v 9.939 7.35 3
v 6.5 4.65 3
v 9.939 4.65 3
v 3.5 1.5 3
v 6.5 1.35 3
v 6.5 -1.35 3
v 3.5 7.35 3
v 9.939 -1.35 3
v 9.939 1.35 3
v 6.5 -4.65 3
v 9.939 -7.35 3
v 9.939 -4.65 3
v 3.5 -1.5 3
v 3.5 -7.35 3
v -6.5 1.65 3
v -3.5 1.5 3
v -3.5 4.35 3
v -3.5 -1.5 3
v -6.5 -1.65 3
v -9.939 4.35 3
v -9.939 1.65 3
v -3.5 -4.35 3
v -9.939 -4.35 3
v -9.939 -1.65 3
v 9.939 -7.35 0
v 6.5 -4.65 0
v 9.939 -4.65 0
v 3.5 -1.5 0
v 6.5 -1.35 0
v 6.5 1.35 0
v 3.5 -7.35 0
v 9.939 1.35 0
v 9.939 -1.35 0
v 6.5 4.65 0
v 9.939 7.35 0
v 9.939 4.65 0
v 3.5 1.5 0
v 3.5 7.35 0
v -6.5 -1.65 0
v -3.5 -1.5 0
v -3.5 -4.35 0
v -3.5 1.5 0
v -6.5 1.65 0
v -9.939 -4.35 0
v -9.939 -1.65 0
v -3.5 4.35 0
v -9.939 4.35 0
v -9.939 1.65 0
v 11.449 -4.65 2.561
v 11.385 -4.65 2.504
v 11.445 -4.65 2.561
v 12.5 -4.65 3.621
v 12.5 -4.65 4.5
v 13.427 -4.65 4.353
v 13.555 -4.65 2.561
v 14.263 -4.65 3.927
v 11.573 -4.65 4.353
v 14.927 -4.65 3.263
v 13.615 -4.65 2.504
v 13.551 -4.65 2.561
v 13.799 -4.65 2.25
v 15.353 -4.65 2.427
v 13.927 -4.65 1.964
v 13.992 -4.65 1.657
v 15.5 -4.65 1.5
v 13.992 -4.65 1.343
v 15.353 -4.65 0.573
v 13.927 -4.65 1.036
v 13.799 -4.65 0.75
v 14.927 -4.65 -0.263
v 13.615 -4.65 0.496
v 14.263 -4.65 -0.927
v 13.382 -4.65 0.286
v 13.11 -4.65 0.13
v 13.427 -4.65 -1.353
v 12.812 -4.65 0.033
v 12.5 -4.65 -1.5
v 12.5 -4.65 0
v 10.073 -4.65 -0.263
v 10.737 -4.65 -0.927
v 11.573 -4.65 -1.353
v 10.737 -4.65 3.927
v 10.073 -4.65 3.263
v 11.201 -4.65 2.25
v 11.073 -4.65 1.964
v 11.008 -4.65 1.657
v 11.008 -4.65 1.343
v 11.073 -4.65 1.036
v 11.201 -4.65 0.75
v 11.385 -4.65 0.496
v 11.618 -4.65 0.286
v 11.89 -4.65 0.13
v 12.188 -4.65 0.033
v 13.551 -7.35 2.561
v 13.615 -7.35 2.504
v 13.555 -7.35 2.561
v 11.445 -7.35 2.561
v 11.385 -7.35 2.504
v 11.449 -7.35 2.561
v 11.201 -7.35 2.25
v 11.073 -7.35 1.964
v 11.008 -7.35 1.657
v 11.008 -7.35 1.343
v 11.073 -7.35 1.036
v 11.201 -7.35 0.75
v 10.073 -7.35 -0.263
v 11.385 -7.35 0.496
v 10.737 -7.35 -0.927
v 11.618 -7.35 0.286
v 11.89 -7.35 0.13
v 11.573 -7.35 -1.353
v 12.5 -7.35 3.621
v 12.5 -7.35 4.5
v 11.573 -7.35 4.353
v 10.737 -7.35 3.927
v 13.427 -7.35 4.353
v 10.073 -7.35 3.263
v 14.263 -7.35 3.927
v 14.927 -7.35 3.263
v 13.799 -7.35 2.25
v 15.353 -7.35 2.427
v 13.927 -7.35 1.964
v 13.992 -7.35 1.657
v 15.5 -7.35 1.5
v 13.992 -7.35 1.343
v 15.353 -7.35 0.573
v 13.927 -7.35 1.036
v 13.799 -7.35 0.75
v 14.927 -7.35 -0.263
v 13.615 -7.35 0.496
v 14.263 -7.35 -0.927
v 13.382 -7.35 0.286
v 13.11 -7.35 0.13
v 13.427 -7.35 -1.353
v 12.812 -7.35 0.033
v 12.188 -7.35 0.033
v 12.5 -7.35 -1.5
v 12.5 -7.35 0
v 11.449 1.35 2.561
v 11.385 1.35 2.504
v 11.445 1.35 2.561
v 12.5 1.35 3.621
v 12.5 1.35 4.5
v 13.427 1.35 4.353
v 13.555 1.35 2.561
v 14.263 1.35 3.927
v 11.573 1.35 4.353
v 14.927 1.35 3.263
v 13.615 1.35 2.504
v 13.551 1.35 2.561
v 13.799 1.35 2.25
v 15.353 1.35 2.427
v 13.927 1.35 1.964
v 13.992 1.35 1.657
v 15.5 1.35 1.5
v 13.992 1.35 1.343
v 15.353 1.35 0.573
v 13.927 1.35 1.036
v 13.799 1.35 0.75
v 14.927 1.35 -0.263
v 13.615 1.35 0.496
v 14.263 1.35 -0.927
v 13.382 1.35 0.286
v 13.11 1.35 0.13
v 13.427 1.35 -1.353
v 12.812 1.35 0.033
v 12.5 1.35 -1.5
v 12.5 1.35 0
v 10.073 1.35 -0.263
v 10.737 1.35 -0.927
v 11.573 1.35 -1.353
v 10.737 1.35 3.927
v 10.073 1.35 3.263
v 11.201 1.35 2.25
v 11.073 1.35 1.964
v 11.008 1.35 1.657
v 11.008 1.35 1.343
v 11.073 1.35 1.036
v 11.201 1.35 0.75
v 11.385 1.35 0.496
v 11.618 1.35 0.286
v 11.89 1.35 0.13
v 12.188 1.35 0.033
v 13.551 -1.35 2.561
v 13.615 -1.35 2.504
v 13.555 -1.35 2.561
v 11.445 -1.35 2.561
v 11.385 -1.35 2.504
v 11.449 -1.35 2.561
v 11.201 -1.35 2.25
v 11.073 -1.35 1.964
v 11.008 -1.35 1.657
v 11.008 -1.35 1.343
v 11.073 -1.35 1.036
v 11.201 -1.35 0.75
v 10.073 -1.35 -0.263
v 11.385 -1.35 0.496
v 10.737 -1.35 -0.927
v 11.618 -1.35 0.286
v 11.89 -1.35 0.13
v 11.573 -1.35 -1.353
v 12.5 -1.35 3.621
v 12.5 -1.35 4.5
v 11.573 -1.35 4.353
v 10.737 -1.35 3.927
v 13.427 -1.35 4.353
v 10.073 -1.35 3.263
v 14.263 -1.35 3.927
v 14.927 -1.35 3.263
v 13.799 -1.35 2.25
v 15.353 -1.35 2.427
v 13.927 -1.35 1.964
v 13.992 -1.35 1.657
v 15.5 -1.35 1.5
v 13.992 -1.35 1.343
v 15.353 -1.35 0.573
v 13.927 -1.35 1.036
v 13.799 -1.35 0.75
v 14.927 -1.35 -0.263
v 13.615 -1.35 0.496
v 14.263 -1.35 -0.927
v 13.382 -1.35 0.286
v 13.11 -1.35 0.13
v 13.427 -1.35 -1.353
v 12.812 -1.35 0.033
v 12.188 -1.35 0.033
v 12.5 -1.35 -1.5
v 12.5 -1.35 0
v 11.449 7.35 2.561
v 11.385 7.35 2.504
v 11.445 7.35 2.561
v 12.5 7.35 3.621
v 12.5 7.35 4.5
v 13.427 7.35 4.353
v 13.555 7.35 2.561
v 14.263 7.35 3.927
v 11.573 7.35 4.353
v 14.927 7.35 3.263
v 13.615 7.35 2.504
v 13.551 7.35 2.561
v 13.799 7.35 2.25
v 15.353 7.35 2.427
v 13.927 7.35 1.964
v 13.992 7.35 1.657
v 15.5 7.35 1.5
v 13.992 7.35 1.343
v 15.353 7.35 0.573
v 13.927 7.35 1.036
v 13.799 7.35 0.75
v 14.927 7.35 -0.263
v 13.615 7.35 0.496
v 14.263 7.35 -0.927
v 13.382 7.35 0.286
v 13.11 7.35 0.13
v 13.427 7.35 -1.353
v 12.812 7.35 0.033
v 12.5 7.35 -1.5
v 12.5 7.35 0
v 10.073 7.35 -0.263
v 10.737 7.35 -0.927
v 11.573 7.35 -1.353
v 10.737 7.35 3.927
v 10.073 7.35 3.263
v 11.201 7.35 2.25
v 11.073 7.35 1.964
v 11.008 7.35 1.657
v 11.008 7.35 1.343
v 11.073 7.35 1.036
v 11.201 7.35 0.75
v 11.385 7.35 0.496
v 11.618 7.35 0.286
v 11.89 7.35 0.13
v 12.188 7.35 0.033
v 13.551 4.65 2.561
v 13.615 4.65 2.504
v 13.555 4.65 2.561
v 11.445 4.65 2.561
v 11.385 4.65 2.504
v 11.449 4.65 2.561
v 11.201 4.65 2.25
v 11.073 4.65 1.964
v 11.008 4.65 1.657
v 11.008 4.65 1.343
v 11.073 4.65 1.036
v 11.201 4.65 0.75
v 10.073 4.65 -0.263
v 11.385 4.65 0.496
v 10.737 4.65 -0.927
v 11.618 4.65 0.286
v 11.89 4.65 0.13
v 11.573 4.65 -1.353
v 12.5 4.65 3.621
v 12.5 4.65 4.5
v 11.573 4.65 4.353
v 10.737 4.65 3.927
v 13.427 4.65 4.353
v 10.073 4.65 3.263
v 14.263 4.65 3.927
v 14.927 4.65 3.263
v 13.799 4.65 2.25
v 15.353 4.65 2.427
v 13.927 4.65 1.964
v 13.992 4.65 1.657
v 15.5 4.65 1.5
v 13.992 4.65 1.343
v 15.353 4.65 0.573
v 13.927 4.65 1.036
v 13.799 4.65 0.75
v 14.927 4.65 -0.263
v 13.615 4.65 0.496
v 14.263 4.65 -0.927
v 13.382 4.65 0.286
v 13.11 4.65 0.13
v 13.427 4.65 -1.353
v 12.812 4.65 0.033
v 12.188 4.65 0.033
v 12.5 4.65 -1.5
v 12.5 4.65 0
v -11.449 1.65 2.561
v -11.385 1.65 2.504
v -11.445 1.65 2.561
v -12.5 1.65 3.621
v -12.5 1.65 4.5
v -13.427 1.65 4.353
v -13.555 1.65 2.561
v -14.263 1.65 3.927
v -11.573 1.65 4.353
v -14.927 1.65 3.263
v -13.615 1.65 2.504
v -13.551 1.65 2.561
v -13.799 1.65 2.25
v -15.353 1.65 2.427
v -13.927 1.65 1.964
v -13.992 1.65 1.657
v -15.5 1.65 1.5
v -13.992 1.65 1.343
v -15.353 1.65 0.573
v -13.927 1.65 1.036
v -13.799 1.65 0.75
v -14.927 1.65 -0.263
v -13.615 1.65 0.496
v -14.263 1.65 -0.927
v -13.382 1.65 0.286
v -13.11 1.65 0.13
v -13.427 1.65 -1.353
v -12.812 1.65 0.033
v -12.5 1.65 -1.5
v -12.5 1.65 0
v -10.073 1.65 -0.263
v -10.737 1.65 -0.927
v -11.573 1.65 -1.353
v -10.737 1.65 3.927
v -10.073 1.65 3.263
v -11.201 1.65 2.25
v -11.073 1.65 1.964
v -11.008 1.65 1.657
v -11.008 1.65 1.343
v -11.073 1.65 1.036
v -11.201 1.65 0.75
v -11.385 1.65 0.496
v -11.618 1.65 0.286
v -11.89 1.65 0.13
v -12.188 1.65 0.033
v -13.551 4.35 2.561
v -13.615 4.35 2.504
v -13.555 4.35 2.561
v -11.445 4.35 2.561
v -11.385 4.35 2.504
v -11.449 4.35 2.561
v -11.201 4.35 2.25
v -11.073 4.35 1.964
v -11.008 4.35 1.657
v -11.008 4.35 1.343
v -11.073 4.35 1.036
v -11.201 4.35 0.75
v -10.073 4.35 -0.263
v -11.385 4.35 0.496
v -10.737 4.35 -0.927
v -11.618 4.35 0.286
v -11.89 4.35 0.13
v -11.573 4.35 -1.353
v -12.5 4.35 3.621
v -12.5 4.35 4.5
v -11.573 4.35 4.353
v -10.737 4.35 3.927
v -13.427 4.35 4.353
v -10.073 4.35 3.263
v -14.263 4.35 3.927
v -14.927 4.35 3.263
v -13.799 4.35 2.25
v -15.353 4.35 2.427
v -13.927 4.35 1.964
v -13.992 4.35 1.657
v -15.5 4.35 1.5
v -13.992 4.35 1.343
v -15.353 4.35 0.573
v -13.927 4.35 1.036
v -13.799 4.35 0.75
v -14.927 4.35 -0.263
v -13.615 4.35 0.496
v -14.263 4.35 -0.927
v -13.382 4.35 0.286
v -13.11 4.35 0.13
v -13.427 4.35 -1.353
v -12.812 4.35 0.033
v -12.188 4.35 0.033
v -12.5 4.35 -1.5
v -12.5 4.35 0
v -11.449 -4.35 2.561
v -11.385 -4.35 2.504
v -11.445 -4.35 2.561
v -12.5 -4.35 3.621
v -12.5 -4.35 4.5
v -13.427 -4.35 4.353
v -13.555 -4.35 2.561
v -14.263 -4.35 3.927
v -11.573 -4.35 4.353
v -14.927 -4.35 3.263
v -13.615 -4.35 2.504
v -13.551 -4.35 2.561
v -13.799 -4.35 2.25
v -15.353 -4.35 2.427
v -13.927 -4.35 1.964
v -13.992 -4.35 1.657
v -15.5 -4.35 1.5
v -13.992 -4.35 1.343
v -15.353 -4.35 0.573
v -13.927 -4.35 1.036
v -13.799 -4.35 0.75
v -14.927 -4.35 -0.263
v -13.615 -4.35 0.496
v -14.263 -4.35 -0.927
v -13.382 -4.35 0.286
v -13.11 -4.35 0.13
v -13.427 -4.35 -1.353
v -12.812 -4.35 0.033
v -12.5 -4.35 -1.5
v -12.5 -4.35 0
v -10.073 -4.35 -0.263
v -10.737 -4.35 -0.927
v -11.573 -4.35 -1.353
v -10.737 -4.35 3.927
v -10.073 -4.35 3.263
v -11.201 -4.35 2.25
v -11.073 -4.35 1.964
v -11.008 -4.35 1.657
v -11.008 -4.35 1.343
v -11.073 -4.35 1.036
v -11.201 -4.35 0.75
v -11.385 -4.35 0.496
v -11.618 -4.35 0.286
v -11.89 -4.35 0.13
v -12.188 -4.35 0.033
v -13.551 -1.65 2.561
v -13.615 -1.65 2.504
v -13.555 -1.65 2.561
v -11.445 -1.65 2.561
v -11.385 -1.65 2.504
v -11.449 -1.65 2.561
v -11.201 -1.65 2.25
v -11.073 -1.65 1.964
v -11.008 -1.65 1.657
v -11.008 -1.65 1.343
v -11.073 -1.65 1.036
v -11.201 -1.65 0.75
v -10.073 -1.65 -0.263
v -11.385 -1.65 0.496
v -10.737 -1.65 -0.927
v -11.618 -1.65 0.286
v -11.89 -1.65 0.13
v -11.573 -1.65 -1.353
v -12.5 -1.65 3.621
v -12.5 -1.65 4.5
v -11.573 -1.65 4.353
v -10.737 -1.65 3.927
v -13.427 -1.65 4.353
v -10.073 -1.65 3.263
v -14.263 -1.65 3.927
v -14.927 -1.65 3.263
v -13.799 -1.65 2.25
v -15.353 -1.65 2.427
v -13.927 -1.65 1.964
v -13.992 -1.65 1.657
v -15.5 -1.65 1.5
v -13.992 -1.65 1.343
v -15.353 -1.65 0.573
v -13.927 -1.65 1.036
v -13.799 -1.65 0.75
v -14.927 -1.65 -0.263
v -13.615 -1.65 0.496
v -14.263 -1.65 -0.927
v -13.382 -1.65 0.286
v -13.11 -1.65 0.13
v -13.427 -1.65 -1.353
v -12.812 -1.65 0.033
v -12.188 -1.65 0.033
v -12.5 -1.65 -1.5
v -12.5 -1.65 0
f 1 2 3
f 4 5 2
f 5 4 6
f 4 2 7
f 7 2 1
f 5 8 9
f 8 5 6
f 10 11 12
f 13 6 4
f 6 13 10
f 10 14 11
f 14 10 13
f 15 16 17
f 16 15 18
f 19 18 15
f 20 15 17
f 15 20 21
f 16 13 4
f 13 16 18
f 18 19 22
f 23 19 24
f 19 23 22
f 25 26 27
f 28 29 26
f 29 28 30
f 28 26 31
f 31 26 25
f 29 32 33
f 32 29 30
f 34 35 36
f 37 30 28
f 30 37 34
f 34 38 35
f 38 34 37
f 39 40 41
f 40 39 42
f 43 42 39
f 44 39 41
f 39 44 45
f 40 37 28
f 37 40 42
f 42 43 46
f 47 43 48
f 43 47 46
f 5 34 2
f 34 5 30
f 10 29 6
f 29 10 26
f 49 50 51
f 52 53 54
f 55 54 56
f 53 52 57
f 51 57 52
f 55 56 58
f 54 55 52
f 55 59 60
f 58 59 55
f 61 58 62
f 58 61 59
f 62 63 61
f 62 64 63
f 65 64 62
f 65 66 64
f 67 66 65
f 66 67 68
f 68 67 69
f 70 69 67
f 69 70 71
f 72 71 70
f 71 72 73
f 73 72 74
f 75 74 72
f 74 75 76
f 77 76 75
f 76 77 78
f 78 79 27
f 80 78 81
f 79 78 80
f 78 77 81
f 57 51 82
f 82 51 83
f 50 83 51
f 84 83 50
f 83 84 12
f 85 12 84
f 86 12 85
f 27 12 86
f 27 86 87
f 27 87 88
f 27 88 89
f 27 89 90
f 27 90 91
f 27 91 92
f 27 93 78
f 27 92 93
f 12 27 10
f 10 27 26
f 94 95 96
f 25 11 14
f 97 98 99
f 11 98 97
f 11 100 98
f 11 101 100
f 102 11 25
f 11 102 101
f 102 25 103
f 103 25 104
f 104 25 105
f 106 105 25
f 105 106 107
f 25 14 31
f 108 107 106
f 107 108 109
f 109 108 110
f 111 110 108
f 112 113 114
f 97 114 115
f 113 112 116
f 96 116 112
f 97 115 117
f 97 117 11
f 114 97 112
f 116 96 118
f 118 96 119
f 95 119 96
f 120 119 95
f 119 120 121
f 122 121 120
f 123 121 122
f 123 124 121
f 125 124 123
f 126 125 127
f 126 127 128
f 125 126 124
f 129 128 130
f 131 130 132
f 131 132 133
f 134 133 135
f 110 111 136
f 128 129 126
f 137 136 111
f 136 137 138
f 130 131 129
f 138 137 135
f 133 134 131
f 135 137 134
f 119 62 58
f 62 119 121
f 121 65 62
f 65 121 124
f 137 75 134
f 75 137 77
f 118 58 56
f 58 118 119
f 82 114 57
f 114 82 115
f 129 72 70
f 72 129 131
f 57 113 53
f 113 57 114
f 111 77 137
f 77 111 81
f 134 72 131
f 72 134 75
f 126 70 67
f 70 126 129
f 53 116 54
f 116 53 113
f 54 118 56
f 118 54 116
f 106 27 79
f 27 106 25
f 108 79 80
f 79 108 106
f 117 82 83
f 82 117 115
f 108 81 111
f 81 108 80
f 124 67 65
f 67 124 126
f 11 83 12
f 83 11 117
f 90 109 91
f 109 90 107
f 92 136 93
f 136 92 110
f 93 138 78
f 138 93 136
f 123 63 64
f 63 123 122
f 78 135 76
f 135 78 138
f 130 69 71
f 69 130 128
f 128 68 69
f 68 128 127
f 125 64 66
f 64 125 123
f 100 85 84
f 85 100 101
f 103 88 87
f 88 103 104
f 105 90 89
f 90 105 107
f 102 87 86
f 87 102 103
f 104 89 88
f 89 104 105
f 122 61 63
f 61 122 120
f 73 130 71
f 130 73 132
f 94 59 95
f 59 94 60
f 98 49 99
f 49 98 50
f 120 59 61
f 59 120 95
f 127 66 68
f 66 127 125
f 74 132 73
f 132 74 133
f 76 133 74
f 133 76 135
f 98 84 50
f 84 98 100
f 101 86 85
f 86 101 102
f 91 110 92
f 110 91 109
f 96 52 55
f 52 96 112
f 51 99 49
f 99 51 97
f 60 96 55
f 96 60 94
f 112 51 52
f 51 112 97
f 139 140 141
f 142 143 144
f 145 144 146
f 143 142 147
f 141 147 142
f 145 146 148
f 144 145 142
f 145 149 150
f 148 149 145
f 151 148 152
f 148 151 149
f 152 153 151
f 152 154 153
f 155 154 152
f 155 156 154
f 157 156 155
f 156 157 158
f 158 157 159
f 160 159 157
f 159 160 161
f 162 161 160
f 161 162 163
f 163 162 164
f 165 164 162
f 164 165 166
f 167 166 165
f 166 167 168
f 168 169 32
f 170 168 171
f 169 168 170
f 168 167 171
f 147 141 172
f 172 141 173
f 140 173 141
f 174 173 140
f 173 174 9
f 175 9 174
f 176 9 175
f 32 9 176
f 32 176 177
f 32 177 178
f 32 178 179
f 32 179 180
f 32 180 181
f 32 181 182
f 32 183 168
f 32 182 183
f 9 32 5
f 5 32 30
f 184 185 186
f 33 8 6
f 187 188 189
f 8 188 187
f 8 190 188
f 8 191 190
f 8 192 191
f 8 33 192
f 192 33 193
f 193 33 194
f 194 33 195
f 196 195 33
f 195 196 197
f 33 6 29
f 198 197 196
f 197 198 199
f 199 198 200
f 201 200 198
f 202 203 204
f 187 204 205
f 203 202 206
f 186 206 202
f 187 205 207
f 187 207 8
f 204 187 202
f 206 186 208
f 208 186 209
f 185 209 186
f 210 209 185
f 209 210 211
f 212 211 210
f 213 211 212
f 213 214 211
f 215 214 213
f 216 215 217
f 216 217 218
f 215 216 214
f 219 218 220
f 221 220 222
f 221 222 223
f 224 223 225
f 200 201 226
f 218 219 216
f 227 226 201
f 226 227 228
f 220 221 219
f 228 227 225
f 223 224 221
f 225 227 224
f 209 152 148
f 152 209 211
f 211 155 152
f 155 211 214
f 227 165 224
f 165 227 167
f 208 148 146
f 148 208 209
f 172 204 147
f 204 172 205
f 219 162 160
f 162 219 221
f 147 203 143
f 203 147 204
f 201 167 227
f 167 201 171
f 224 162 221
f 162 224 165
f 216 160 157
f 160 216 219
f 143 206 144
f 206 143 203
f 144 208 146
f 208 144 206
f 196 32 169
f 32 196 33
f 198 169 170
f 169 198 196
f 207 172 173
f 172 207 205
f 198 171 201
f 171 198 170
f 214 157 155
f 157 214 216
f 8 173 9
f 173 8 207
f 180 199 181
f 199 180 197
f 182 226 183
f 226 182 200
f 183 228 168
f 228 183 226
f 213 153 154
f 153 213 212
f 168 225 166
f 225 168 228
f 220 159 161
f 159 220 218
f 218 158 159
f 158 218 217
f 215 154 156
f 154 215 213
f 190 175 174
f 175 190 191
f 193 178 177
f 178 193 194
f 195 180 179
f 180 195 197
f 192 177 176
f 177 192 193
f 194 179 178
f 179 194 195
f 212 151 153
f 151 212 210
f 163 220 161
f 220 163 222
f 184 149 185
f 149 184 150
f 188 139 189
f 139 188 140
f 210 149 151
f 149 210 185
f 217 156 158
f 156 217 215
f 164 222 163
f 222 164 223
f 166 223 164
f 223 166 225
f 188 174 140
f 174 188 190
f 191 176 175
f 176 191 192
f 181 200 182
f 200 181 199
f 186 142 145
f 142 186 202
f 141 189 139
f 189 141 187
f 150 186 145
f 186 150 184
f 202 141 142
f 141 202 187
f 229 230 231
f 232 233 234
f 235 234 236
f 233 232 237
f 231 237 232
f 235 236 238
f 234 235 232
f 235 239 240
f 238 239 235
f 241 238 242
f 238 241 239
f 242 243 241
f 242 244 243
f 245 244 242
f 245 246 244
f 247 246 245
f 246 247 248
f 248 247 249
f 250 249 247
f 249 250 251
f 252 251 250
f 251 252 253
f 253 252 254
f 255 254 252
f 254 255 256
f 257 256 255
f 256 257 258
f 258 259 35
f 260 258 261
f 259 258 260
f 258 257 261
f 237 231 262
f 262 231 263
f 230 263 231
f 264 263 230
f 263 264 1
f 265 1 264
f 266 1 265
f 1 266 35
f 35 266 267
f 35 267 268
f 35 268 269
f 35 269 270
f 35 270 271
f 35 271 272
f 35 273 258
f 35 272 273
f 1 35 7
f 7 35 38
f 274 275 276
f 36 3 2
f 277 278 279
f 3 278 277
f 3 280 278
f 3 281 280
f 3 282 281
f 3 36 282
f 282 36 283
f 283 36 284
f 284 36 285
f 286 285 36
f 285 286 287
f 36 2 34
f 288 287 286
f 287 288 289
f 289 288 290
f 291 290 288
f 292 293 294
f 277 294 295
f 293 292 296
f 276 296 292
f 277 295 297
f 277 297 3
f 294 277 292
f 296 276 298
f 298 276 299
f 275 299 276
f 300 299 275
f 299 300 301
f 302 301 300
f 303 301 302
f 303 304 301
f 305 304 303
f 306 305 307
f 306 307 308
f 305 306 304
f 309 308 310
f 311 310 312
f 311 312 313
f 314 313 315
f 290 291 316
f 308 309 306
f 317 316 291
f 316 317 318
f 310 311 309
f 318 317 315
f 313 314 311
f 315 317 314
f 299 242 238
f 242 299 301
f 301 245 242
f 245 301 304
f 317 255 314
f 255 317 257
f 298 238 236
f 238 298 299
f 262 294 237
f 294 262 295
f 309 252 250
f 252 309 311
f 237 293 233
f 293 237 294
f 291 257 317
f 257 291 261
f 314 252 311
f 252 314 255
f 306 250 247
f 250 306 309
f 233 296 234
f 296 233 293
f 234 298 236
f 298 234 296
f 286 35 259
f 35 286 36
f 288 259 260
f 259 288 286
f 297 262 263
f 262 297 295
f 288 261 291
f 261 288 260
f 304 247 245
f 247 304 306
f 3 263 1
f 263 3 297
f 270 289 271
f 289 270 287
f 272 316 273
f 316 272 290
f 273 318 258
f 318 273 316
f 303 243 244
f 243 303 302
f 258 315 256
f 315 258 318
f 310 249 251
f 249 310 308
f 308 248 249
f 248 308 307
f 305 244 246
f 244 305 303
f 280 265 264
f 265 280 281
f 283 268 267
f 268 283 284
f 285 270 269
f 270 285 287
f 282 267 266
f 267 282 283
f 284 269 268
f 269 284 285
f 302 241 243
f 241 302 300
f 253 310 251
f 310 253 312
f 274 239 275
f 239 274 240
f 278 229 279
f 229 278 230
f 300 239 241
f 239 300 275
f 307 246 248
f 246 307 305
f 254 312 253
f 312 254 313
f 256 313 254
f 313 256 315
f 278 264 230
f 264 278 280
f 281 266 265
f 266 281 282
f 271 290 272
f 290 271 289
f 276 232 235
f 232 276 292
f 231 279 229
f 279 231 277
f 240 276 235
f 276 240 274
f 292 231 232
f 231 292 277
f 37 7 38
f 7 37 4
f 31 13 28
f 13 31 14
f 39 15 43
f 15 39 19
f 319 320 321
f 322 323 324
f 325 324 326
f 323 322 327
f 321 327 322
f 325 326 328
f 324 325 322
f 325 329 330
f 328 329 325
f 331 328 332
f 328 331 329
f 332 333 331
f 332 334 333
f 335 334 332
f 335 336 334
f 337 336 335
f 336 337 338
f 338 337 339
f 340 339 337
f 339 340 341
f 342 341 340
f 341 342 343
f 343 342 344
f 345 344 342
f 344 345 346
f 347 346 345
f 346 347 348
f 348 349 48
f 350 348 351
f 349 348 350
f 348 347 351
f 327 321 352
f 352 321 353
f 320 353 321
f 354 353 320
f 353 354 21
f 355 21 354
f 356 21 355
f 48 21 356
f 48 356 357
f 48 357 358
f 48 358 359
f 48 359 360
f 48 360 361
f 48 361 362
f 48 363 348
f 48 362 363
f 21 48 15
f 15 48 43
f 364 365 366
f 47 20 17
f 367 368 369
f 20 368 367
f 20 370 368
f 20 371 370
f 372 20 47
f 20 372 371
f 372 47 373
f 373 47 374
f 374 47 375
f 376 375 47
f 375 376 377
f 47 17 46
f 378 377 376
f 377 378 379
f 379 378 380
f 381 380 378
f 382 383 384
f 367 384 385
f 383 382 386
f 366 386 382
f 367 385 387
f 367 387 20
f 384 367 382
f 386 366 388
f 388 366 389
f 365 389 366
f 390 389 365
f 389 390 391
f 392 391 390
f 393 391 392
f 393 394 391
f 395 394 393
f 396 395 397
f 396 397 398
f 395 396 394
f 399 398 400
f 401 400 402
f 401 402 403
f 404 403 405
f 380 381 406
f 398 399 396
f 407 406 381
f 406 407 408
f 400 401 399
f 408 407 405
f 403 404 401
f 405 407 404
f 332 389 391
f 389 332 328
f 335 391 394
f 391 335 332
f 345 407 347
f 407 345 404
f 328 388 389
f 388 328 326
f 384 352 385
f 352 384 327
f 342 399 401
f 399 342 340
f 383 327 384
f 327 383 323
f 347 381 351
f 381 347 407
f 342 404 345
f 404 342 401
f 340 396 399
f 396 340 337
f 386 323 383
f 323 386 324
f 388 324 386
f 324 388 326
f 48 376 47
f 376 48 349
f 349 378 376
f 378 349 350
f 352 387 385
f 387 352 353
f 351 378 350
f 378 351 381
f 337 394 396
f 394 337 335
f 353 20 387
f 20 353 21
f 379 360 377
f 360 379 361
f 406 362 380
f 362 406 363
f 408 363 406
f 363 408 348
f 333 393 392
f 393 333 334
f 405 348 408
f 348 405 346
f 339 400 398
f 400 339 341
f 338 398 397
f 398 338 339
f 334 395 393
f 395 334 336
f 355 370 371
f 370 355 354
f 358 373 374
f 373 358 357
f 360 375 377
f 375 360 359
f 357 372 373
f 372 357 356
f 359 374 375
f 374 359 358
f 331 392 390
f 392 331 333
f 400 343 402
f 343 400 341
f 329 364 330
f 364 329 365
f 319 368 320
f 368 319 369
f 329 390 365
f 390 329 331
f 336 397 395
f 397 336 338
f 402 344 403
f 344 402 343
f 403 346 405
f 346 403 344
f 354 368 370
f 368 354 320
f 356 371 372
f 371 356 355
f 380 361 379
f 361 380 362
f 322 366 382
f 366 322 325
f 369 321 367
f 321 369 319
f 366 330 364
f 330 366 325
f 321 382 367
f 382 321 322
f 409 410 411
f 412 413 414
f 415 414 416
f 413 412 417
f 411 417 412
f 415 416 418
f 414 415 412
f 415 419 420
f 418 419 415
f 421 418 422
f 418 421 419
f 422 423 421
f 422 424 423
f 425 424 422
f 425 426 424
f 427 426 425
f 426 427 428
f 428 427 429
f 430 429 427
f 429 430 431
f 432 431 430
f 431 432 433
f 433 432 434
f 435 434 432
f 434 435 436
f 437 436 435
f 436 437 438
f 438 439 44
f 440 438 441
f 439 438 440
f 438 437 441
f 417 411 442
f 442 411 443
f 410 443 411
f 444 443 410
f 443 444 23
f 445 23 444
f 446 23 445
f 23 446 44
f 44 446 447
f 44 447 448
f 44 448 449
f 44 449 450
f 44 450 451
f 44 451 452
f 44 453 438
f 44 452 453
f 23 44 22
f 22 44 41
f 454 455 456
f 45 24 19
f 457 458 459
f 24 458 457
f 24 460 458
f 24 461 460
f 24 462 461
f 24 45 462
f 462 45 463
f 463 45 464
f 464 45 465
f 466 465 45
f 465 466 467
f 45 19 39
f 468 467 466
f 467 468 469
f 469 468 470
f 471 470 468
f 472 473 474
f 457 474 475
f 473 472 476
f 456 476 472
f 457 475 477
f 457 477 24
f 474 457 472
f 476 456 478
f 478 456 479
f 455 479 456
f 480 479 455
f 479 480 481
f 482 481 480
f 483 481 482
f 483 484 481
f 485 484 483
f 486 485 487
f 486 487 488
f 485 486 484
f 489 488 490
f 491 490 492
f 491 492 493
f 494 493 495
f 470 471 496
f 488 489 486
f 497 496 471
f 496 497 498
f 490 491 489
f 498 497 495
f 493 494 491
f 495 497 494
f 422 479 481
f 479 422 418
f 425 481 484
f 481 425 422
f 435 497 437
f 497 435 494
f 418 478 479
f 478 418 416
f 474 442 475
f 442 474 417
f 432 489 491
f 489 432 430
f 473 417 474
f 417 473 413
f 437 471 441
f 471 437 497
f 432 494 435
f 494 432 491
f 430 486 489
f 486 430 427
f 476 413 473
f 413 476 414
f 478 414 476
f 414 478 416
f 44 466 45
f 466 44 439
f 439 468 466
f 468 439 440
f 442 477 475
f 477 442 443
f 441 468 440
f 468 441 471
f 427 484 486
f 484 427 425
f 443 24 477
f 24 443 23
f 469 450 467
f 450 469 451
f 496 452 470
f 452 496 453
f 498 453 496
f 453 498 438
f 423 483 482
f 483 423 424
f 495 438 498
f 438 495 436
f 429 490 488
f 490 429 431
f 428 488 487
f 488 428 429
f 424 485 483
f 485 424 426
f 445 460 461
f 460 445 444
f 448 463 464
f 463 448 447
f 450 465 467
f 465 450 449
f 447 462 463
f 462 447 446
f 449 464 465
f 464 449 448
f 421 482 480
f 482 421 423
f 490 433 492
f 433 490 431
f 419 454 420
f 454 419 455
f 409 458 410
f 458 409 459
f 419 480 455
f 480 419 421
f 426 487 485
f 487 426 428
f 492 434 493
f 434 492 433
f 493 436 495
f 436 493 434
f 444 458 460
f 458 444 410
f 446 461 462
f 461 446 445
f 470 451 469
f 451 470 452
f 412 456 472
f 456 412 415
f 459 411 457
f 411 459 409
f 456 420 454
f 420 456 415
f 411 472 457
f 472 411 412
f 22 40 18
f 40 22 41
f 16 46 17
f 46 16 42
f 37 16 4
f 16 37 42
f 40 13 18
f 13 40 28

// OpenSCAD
 use <MCAD/teardrop.scad>

t = 3;
l = 10;

render_eps = 0.01;

module slot(tol=0.1, d=2*t, t=3){
    translate([d, 0, 0])
    difference(){
        union(){
            translate([-(d+t/2)/2, 0, 0])
            cube([d - t/2, t - 2*tol, t], center=true);
            rotate(90, [1, 0, 0])
            cylinder(t - 2*tol, t, t, center=true, $fn=20);
            //rotate(90, [0, 0, 1])
            //teardrop(t, t - 2*tol, center=true, angle=90, $fn=20);
        }
        rotate(90, [0, 0, 1])
        teardrop(t/2, 4*t + render_eps, angle=90, center=true, $fn=20);
    }
}

module slots(n=2, tol=0.1, d=2*t, t=3){
    translate([-t/2, 0, t/2])
    cube([t, (2*n - 1)*t - 2*tol, t], center=true);
    for (i = [0:n-1]){
        translate([0, (2 * i - n + 1) * t, t/2])
        slot(tol=tol, d=d, t=t);
    }
}

module segment(l=25, t=3, d=6){
    inner_l = l - 2*d;
    translate([0, 0, t/2])
    cube([inner_l, t, t], center=true);
    translate([inner_l/2, 0, 0])
    slots(3, tol=0.15);

    //rotate(180, [1, 0, 0])
    rotate(180, [0, 0, 1])
    translate([inner_l/2, 0, 0])
    slots(2, tol=0.15, d=d, t=t);
}

segment();
//translate([l + 2*t, 0, 0])
//segment();
